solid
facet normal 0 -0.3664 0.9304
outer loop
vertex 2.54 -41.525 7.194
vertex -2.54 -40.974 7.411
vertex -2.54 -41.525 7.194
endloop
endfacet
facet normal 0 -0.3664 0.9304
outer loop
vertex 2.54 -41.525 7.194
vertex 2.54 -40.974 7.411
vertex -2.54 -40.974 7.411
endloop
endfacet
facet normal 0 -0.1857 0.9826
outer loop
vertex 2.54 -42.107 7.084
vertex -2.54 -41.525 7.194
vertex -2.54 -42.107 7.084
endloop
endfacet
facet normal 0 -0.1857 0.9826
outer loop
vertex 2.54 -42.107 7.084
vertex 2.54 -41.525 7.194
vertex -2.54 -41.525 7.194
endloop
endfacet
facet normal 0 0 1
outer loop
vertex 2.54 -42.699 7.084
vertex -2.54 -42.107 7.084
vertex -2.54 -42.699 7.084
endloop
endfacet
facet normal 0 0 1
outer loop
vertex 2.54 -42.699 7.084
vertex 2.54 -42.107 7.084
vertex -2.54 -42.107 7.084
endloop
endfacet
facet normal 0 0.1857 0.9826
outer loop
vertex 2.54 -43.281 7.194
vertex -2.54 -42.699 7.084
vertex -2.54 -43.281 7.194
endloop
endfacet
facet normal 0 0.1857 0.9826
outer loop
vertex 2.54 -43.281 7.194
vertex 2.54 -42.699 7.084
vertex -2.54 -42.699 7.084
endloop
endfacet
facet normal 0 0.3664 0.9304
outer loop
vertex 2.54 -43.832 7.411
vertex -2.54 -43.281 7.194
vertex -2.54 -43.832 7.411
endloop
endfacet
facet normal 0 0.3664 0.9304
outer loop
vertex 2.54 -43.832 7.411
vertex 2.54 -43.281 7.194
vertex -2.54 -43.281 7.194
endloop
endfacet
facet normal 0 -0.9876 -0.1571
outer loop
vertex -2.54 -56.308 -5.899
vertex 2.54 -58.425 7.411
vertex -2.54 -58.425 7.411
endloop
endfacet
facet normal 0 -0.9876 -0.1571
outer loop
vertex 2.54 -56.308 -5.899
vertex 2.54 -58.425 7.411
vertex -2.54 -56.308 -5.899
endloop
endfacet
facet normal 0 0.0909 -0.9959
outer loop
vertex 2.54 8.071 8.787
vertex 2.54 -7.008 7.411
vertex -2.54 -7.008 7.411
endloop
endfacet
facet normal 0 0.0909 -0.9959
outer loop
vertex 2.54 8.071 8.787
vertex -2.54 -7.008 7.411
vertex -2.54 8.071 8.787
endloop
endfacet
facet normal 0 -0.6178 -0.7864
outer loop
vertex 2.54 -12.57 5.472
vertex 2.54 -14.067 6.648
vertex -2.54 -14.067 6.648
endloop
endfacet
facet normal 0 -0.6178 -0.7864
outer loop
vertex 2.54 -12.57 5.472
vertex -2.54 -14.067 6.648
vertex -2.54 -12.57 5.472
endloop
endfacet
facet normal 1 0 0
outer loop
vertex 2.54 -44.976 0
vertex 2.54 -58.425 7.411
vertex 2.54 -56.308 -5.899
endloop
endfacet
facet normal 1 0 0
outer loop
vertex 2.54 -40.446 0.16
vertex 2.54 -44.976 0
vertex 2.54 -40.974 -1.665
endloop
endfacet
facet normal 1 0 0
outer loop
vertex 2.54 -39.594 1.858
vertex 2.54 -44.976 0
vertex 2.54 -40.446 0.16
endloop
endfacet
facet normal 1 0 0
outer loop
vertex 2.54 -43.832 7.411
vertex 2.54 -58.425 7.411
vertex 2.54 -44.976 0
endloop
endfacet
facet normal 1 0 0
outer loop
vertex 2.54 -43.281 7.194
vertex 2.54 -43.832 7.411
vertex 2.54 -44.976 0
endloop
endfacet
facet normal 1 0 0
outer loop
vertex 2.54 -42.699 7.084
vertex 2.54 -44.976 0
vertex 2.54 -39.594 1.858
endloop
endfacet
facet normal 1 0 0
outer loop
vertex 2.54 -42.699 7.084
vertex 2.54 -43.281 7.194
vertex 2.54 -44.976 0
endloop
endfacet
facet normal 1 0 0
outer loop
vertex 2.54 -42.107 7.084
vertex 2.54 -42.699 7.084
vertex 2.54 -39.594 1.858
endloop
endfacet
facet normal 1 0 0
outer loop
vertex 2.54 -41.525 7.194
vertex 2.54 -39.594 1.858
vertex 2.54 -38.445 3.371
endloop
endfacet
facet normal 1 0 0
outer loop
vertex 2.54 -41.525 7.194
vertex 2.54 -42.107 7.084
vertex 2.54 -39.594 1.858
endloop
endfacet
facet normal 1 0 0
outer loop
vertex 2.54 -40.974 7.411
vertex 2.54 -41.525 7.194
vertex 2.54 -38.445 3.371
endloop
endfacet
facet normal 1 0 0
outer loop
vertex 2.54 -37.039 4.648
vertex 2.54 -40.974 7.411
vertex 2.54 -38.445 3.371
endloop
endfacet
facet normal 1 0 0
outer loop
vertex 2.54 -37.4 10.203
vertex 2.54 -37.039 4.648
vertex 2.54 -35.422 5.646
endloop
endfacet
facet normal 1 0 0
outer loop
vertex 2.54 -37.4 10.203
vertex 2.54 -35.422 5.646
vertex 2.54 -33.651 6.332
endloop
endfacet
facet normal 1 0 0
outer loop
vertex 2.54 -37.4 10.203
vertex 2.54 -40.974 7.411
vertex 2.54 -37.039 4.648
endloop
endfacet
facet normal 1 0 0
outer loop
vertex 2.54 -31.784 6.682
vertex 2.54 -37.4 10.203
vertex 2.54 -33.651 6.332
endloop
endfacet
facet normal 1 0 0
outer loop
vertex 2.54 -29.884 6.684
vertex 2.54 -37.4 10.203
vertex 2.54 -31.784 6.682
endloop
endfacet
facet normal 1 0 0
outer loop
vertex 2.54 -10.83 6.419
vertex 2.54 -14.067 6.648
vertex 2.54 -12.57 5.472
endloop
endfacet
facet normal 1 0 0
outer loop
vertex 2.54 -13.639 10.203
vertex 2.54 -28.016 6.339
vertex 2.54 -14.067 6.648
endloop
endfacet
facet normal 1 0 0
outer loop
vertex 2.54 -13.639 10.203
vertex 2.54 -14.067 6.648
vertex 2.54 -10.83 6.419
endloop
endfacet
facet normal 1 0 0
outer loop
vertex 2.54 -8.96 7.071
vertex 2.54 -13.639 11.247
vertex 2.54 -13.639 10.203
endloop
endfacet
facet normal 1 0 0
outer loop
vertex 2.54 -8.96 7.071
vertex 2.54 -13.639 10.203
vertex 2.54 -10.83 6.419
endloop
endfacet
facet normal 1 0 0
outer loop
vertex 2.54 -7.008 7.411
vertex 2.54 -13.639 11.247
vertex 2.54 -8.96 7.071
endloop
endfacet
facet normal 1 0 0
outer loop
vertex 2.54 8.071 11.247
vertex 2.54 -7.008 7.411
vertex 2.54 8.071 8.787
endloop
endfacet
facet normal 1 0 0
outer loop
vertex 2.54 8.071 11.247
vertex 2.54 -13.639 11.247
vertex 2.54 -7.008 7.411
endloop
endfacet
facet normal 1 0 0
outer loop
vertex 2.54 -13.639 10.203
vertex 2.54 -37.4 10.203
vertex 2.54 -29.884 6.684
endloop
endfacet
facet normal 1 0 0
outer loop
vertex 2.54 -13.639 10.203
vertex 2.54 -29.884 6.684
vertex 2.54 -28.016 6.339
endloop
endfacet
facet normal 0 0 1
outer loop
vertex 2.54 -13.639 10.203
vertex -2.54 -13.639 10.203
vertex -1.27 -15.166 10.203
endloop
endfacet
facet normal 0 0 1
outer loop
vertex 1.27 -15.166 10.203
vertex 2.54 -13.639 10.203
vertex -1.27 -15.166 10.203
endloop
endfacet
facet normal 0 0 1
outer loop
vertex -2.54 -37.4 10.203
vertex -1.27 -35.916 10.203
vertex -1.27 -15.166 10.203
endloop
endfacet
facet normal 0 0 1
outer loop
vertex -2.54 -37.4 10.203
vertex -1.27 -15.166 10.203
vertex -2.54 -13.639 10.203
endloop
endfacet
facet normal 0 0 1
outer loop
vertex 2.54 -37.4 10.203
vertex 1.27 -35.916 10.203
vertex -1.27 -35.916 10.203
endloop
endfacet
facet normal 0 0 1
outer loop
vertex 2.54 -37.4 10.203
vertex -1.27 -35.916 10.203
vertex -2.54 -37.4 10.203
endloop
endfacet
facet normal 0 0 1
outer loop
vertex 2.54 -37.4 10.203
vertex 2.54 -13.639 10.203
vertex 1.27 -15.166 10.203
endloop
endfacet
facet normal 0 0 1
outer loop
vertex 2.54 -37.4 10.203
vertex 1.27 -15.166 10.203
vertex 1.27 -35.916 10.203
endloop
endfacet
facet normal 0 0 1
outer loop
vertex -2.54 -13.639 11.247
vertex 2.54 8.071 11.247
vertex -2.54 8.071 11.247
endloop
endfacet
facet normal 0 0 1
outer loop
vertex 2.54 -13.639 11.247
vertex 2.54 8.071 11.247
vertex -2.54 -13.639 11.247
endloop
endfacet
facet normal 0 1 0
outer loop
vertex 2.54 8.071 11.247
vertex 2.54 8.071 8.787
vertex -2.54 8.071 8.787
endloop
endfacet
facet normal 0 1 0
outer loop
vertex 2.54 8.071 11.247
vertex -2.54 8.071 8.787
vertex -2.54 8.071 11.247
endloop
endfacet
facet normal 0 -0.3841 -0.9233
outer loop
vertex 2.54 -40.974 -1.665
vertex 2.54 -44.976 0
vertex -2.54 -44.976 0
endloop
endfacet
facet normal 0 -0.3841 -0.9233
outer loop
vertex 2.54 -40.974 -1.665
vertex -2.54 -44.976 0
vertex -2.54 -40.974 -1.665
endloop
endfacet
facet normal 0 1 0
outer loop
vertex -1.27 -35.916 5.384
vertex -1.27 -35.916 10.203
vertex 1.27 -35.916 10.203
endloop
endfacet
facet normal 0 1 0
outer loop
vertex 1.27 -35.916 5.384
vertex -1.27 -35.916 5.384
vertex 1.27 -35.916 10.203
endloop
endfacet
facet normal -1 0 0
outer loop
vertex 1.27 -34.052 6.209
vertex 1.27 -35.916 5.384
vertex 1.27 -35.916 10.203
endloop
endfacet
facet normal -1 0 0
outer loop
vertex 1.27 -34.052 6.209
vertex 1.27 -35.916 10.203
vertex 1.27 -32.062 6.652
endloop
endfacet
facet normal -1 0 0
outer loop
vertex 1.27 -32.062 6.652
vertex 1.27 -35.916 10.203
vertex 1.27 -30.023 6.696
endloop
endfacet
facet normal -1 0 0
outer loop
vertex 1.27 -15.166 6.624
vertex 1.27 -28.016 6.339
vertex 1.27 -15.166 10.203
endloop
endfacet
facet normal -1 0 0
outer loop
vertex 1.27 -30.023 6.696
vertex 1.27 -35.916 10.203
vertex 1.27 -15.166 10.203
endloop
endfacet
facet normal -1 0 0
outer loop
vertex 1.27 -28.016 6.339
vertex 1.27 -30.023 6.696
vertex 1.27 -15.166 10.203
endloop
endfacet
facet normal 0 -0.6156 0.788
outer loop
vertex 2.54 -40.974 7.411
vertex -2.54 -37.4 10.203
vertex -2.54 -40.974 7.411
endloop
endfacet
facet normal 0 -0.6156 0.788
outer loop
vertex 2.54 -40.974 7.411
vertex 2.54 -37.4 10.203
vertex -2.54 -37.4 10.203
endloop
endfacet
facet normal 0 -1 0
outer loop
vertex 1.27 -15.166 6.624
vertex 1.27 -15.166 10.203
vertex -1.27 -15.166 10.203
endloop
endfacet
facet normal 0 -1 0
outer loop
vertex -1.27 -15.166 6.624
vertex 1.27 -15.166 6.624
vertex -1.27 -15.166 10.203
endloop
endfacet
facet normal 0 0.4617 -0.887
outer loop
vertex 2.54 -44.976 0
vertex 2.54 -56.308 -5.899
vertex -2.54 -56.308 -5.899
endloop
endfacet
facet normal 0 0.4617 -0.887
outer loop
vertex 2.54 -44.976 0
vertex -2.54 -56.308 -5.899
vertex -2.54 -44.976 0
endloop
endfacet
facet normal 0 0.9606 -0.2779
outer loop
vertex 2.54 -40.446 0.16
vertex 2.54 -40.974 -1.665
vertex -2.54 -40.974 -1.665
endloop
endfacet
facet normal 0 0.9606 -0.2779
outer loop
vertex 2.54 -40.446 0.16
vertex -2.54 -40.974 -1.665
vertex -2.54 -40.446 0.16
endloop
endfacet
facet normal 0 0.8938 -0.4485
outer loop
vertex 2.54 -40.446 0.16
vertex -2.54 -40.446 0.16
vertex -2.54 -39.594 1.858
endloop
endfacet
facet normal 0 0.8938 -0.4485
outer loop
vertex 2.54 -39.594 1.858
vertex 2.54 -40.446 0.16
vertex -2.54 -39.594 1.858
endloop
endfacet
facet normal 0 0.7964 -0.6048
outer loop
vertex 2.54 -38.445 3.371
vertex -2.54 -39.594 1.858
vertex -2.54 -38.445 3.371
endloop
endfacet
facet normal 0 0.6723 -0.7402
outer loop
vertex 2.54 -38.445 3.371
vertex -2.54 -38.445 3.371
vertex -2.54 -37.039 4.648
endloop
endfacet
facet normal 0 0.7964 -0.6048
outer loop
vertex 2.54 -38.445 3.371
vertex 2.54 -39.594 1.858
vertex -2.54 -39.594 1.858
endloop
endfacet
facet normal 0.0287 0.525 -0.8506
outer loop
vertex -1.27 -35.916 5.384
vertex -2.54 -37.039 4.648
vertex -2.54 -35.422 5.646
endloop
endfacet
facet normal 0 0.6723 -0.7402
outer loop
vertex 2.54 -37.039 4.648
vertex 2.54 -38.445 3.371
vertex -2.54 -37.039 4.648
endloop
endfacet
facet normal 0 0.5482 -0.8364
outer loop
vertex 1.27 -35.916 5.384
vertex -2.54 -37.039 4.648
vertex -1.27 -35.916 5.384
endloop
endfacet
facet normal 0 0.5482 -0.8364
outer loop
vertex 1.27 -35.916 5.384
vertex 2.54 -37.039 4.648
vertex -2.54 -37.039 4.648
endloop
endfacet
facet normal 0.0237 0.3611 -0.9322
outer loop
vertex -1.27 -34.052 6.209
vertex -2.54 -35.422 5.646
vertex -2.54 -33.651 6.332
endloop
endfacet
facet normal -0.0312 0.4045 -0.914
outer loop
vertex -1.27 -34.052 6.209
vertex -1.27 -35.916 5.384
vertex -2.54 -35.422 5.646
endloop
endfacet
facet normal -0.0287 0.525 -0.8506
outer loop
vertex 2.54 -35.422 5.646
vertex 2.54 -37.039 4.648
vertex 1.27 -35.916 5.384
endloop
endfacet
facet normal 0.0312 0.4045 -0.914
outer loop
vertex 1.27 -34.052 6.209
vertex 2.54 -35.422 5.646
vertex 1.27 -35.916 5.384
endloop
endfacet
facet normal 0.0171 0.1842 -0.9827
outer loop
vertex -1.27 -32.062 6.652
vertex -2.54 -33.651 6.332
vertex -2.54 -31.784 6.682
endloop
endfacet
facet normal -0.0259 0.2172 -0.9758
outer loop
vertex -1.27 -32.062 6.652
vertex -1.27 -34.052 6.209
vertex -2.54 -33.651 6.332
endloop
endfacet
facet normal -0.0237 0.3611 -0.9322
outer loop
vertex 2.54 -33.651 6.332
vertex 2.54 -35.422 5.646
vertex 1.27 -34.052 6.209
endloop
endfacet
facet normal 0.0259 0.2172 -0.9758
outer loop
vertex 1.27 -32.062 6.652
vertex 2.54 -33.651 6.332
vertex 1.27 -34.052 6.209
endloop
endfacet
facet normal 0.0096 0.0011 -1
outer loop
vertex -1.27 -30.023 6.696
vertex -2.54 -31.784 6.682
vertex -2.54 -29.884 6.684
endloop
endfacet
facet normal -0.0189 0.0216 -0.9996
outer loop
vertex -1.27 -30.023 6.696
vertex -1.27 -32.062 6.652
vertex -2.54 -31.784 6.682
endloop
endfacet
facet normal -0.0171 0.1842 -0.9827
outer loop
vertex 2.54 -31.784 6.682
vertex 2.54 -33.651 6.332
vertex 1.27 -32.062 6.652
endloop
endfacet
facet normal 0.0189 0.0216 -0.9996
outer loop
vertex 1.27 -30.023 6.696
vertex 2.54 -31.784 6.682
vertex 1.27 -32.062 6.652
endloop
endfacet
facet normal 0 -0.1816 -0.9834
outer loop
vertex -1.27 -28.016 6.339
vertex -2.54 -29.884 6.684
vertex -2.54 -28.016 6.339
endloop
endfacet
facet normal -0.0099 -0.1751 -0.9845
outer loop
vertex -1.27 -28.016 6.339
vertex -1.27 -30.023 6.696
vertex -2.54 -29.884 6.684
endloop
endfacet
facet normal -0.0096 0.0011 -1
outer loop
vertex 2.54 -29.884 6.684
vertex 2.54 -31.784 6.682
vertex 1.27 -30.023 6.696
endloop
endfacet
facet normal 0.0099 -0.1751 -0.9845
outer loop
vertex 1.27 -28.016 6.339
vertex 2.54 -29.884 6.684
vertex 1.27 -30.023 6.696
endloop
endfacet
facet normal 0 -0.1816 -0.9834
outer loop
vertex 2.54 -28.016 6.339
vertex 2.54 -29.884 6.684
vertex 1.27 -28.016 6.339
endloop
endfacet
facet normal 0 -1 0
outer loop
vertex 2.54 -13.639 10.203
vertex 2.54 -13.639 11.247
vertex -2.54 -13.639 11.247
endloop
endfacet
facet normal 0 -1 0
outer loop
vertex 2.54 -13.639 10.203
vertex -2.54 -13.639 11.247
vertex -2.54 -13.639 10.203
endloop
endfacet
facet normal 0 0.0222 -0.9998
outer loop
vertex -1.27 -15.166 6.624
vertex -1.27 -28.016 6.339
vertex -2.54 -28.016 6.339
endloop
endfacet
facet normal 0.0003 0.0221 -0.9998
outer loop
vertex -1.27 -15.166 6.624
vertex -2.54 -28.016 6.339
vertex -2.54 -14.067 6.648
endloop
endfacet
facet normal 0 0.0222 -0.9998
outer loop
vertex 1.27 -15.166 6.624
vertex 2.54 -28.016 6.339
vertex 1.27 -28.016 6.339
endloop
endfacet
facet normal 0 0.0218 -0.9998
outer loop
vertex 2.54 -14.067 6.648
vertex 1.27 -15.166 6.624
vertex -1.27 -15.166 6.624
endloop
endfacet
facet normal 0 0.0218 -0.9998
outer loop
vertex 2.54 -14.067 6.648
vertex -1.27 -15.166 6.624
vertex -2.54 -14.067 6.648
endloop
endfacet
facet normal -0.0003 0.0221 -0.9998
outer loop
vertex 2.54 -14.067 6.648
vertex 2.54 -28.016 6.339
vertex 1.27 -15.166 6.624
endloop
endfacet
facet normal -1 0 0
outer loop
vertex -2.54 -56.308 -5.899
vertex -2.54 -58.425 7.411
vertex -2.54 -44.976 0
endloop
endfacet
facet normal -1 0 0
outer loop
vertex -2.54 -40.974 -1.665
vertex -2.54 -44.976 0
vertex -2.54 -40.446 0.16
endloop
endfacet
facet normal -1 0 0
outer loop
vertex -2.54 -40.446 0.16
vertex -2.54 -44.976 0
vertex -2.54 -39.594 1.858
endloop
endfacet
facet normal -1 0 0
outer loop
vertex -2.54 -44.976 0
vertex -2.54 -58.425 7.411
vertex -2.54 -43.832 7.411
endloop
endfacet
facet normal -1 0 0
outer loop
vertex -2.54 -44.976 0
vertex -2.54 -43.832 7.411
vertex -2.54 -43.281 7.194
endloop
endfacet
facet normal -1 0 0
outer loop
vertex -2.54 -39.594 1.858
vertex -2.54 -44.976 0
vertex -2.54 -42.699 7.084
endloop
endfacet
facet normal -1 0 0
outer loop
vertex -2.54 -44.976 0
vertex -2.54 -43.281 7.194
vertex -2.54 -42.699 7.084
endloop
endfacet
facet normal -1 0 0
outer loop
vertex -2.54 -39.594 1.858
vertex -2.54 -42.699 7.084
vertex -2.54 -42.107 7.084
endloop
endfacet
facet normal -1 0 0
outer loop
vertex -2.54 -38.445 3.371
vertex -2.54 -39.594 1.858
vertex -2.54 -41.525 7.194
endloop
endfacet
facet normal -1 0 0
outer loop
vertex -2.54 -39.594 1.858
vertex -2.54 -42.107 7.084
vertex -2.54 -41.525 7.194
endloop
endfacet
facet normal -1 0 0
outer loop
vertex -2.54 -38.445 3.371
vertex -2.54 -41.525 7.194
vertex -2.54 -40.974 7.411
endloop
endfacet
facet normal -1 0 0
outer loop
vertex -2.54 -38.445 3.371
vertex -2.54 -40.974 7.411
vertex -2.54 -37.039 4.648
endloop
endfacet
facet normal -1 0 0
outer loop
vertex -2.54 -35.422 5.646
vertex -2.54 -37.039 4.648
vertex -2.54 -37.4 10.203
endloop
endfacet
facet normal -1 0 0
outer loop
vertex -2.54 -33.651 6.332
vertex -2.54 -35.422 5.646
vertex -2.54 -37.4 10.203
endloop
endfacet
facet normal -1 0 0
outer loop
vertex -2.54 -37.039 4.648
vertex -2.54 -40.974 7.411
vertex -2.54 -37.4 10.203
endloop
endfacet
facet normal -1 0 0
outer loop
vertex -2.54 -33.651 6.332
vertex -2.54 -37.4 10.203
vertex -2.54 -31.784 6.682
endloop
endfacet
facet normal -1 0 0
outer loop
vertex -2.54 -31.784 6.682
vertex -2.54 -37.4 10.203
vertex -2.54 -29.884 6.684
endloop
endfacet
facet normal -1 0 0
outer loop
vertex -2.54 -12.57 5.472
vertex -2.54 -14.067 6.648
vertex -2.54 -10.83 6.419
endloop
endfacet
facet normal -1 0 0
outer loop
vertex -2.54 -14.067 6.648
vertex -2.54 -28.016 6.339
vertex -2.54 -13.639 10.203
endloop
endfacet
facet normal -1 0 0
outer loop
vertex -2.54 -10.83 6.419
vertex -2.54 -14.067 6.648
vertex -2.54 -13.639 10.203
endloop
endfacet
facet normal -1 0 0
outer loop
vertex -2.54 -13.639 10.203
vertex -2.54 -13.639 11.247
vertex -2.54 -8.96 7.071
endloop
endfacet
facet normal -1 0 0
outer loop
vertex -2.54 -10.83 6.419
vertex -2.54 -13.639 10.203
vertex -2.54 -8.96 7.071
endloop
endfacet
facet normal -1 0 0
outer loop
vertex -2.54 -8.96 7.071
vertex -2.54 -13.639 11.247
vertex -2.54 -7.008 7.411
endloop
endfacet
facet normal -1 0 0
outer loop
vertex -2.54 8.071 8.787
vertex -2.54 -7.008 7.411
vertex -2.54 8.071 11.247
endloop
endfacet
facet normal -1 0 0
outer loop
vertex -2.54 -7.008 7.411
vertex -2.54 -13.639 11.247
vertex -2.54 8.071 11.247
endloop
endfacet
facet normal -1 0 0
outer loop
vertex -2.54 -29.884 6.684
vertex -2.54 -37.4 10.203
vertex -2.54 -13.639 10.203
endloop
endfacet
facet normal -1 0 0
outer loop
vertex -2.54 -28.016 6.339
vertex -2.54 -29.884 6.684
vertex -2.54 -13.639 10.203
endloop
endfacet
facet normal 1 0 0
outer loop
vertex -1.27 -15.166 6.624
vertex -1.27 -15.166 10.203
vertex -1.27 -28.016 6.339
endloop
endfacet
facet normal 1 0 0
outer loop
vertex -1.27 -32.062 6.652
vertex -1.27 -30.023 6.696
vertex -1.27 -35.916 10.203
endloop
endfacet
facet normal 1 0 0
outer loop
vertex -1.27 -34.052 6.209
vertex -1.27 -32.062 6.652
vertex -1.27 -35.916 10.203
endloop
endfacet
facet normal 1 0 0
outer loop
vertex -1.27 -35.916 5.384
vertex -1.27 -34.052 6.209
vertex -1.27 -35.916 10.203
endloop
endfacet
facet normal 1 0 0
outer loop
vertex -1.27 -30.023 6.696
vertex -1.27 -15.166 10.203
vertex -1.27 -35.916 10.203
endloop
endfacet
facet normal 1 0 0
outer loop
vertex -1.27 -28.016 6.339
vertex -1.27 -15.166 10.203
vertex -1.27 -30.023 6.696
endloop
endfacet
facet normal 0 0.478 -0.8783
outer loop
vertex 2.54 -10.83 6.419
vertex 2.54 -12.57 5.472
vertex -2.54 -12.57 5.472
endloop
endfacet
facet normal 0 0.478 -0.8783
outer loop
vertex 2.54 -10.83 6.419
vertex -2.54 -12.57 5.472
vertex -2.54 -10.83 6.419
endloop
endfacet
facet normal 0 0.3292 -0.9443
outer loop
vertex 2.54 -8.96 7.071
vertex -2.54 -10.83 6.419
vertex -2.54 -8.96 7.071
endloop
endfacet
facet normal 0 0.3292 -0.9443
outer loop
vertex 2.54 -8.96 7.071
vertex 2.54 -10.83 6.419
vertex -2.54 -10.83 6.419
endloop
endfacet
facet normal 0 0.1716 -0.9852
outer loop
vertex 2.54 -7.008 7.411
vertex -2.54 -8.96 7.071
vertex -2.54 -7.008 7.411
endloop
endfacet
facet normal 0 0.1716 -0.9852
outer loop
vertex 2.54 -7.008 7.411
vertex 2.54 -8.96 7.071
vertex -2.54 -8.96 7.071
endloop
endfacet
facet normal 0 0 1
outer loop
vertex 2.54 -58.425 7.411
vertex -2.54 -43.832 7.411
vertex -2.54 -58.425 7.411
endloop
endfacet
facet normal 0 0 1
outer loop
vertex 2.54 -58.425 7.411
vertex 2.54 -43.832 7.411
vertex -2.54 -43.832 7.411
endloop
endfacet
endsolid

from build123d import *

# Parameters (mm, degrees)
F1_DEPTH = 2.54
F3_DEPTH = 25.4


with BuildPart() as f1:
    # F0 (on Right) → F1 (new body, symmetric)
    with BuildSketch(Plane.YZ):
        with BuildLine():
            Line((-43.832254, 7.411134), (-58.425114, 7.411134))
            Line((-58.425114, 7.411134), (-56.307647, -5.898658))
            Line((-56.307647, -5.898658), (-44.975612, 0))
            Line((-44.975612, 0), (-40.973853, -1.664879))
            ThreePointArc((-40.973853, -1.664879), (-36.253593, 5.184437), (-28.015766, 6.338645))
            Line((-28.015766, 6.338645), (-14.066866, 6.648439))
            Line((-14.066866, 6.648439), (-12.56959, 5.472009))
            ThreePointArc((-12.56959, 5.472009), (-9.908052, 6.78319), (-7.008282, 7.411134))
            Line((-7.008282, 7.411134), (8.071418, 8.787404))
            Line((8.071418, 8.787404), (8.071418, 11.247213))
            Line((8.071418, 11.247213), (-13.639072, 11.247213))
            Line((-13.639072, 11.247213), (-13.639072, 10.202761))
            Line((-13.639072, 10.202761), (-37.399668, 10.202761))
            Line((-37.399668, 10.202761), (-40.973853, 7.411134))
            ThreePointArc((-40.973853, 7.411134), (-42.403053, 7.069715), (-43.832254, 7.411134))
        make_face()
    extrude(amount=F1_DEPTH, both=True)

    # F2 (on face) → F3 (cut)
    with BuildSketch(Plane.XY.offset(10.202761)):
        Polygon((-1.27, -15.166366), (-1.27, -25.51937), (-1.27, -35.916388), (1.27, -35.916388), (1.27, -25.51937), (1.27, -15.166366), align=None)
    extrude(amount=-F3_DEPTH, mode=Mode.SUBTRACT)


solid = f1.part
